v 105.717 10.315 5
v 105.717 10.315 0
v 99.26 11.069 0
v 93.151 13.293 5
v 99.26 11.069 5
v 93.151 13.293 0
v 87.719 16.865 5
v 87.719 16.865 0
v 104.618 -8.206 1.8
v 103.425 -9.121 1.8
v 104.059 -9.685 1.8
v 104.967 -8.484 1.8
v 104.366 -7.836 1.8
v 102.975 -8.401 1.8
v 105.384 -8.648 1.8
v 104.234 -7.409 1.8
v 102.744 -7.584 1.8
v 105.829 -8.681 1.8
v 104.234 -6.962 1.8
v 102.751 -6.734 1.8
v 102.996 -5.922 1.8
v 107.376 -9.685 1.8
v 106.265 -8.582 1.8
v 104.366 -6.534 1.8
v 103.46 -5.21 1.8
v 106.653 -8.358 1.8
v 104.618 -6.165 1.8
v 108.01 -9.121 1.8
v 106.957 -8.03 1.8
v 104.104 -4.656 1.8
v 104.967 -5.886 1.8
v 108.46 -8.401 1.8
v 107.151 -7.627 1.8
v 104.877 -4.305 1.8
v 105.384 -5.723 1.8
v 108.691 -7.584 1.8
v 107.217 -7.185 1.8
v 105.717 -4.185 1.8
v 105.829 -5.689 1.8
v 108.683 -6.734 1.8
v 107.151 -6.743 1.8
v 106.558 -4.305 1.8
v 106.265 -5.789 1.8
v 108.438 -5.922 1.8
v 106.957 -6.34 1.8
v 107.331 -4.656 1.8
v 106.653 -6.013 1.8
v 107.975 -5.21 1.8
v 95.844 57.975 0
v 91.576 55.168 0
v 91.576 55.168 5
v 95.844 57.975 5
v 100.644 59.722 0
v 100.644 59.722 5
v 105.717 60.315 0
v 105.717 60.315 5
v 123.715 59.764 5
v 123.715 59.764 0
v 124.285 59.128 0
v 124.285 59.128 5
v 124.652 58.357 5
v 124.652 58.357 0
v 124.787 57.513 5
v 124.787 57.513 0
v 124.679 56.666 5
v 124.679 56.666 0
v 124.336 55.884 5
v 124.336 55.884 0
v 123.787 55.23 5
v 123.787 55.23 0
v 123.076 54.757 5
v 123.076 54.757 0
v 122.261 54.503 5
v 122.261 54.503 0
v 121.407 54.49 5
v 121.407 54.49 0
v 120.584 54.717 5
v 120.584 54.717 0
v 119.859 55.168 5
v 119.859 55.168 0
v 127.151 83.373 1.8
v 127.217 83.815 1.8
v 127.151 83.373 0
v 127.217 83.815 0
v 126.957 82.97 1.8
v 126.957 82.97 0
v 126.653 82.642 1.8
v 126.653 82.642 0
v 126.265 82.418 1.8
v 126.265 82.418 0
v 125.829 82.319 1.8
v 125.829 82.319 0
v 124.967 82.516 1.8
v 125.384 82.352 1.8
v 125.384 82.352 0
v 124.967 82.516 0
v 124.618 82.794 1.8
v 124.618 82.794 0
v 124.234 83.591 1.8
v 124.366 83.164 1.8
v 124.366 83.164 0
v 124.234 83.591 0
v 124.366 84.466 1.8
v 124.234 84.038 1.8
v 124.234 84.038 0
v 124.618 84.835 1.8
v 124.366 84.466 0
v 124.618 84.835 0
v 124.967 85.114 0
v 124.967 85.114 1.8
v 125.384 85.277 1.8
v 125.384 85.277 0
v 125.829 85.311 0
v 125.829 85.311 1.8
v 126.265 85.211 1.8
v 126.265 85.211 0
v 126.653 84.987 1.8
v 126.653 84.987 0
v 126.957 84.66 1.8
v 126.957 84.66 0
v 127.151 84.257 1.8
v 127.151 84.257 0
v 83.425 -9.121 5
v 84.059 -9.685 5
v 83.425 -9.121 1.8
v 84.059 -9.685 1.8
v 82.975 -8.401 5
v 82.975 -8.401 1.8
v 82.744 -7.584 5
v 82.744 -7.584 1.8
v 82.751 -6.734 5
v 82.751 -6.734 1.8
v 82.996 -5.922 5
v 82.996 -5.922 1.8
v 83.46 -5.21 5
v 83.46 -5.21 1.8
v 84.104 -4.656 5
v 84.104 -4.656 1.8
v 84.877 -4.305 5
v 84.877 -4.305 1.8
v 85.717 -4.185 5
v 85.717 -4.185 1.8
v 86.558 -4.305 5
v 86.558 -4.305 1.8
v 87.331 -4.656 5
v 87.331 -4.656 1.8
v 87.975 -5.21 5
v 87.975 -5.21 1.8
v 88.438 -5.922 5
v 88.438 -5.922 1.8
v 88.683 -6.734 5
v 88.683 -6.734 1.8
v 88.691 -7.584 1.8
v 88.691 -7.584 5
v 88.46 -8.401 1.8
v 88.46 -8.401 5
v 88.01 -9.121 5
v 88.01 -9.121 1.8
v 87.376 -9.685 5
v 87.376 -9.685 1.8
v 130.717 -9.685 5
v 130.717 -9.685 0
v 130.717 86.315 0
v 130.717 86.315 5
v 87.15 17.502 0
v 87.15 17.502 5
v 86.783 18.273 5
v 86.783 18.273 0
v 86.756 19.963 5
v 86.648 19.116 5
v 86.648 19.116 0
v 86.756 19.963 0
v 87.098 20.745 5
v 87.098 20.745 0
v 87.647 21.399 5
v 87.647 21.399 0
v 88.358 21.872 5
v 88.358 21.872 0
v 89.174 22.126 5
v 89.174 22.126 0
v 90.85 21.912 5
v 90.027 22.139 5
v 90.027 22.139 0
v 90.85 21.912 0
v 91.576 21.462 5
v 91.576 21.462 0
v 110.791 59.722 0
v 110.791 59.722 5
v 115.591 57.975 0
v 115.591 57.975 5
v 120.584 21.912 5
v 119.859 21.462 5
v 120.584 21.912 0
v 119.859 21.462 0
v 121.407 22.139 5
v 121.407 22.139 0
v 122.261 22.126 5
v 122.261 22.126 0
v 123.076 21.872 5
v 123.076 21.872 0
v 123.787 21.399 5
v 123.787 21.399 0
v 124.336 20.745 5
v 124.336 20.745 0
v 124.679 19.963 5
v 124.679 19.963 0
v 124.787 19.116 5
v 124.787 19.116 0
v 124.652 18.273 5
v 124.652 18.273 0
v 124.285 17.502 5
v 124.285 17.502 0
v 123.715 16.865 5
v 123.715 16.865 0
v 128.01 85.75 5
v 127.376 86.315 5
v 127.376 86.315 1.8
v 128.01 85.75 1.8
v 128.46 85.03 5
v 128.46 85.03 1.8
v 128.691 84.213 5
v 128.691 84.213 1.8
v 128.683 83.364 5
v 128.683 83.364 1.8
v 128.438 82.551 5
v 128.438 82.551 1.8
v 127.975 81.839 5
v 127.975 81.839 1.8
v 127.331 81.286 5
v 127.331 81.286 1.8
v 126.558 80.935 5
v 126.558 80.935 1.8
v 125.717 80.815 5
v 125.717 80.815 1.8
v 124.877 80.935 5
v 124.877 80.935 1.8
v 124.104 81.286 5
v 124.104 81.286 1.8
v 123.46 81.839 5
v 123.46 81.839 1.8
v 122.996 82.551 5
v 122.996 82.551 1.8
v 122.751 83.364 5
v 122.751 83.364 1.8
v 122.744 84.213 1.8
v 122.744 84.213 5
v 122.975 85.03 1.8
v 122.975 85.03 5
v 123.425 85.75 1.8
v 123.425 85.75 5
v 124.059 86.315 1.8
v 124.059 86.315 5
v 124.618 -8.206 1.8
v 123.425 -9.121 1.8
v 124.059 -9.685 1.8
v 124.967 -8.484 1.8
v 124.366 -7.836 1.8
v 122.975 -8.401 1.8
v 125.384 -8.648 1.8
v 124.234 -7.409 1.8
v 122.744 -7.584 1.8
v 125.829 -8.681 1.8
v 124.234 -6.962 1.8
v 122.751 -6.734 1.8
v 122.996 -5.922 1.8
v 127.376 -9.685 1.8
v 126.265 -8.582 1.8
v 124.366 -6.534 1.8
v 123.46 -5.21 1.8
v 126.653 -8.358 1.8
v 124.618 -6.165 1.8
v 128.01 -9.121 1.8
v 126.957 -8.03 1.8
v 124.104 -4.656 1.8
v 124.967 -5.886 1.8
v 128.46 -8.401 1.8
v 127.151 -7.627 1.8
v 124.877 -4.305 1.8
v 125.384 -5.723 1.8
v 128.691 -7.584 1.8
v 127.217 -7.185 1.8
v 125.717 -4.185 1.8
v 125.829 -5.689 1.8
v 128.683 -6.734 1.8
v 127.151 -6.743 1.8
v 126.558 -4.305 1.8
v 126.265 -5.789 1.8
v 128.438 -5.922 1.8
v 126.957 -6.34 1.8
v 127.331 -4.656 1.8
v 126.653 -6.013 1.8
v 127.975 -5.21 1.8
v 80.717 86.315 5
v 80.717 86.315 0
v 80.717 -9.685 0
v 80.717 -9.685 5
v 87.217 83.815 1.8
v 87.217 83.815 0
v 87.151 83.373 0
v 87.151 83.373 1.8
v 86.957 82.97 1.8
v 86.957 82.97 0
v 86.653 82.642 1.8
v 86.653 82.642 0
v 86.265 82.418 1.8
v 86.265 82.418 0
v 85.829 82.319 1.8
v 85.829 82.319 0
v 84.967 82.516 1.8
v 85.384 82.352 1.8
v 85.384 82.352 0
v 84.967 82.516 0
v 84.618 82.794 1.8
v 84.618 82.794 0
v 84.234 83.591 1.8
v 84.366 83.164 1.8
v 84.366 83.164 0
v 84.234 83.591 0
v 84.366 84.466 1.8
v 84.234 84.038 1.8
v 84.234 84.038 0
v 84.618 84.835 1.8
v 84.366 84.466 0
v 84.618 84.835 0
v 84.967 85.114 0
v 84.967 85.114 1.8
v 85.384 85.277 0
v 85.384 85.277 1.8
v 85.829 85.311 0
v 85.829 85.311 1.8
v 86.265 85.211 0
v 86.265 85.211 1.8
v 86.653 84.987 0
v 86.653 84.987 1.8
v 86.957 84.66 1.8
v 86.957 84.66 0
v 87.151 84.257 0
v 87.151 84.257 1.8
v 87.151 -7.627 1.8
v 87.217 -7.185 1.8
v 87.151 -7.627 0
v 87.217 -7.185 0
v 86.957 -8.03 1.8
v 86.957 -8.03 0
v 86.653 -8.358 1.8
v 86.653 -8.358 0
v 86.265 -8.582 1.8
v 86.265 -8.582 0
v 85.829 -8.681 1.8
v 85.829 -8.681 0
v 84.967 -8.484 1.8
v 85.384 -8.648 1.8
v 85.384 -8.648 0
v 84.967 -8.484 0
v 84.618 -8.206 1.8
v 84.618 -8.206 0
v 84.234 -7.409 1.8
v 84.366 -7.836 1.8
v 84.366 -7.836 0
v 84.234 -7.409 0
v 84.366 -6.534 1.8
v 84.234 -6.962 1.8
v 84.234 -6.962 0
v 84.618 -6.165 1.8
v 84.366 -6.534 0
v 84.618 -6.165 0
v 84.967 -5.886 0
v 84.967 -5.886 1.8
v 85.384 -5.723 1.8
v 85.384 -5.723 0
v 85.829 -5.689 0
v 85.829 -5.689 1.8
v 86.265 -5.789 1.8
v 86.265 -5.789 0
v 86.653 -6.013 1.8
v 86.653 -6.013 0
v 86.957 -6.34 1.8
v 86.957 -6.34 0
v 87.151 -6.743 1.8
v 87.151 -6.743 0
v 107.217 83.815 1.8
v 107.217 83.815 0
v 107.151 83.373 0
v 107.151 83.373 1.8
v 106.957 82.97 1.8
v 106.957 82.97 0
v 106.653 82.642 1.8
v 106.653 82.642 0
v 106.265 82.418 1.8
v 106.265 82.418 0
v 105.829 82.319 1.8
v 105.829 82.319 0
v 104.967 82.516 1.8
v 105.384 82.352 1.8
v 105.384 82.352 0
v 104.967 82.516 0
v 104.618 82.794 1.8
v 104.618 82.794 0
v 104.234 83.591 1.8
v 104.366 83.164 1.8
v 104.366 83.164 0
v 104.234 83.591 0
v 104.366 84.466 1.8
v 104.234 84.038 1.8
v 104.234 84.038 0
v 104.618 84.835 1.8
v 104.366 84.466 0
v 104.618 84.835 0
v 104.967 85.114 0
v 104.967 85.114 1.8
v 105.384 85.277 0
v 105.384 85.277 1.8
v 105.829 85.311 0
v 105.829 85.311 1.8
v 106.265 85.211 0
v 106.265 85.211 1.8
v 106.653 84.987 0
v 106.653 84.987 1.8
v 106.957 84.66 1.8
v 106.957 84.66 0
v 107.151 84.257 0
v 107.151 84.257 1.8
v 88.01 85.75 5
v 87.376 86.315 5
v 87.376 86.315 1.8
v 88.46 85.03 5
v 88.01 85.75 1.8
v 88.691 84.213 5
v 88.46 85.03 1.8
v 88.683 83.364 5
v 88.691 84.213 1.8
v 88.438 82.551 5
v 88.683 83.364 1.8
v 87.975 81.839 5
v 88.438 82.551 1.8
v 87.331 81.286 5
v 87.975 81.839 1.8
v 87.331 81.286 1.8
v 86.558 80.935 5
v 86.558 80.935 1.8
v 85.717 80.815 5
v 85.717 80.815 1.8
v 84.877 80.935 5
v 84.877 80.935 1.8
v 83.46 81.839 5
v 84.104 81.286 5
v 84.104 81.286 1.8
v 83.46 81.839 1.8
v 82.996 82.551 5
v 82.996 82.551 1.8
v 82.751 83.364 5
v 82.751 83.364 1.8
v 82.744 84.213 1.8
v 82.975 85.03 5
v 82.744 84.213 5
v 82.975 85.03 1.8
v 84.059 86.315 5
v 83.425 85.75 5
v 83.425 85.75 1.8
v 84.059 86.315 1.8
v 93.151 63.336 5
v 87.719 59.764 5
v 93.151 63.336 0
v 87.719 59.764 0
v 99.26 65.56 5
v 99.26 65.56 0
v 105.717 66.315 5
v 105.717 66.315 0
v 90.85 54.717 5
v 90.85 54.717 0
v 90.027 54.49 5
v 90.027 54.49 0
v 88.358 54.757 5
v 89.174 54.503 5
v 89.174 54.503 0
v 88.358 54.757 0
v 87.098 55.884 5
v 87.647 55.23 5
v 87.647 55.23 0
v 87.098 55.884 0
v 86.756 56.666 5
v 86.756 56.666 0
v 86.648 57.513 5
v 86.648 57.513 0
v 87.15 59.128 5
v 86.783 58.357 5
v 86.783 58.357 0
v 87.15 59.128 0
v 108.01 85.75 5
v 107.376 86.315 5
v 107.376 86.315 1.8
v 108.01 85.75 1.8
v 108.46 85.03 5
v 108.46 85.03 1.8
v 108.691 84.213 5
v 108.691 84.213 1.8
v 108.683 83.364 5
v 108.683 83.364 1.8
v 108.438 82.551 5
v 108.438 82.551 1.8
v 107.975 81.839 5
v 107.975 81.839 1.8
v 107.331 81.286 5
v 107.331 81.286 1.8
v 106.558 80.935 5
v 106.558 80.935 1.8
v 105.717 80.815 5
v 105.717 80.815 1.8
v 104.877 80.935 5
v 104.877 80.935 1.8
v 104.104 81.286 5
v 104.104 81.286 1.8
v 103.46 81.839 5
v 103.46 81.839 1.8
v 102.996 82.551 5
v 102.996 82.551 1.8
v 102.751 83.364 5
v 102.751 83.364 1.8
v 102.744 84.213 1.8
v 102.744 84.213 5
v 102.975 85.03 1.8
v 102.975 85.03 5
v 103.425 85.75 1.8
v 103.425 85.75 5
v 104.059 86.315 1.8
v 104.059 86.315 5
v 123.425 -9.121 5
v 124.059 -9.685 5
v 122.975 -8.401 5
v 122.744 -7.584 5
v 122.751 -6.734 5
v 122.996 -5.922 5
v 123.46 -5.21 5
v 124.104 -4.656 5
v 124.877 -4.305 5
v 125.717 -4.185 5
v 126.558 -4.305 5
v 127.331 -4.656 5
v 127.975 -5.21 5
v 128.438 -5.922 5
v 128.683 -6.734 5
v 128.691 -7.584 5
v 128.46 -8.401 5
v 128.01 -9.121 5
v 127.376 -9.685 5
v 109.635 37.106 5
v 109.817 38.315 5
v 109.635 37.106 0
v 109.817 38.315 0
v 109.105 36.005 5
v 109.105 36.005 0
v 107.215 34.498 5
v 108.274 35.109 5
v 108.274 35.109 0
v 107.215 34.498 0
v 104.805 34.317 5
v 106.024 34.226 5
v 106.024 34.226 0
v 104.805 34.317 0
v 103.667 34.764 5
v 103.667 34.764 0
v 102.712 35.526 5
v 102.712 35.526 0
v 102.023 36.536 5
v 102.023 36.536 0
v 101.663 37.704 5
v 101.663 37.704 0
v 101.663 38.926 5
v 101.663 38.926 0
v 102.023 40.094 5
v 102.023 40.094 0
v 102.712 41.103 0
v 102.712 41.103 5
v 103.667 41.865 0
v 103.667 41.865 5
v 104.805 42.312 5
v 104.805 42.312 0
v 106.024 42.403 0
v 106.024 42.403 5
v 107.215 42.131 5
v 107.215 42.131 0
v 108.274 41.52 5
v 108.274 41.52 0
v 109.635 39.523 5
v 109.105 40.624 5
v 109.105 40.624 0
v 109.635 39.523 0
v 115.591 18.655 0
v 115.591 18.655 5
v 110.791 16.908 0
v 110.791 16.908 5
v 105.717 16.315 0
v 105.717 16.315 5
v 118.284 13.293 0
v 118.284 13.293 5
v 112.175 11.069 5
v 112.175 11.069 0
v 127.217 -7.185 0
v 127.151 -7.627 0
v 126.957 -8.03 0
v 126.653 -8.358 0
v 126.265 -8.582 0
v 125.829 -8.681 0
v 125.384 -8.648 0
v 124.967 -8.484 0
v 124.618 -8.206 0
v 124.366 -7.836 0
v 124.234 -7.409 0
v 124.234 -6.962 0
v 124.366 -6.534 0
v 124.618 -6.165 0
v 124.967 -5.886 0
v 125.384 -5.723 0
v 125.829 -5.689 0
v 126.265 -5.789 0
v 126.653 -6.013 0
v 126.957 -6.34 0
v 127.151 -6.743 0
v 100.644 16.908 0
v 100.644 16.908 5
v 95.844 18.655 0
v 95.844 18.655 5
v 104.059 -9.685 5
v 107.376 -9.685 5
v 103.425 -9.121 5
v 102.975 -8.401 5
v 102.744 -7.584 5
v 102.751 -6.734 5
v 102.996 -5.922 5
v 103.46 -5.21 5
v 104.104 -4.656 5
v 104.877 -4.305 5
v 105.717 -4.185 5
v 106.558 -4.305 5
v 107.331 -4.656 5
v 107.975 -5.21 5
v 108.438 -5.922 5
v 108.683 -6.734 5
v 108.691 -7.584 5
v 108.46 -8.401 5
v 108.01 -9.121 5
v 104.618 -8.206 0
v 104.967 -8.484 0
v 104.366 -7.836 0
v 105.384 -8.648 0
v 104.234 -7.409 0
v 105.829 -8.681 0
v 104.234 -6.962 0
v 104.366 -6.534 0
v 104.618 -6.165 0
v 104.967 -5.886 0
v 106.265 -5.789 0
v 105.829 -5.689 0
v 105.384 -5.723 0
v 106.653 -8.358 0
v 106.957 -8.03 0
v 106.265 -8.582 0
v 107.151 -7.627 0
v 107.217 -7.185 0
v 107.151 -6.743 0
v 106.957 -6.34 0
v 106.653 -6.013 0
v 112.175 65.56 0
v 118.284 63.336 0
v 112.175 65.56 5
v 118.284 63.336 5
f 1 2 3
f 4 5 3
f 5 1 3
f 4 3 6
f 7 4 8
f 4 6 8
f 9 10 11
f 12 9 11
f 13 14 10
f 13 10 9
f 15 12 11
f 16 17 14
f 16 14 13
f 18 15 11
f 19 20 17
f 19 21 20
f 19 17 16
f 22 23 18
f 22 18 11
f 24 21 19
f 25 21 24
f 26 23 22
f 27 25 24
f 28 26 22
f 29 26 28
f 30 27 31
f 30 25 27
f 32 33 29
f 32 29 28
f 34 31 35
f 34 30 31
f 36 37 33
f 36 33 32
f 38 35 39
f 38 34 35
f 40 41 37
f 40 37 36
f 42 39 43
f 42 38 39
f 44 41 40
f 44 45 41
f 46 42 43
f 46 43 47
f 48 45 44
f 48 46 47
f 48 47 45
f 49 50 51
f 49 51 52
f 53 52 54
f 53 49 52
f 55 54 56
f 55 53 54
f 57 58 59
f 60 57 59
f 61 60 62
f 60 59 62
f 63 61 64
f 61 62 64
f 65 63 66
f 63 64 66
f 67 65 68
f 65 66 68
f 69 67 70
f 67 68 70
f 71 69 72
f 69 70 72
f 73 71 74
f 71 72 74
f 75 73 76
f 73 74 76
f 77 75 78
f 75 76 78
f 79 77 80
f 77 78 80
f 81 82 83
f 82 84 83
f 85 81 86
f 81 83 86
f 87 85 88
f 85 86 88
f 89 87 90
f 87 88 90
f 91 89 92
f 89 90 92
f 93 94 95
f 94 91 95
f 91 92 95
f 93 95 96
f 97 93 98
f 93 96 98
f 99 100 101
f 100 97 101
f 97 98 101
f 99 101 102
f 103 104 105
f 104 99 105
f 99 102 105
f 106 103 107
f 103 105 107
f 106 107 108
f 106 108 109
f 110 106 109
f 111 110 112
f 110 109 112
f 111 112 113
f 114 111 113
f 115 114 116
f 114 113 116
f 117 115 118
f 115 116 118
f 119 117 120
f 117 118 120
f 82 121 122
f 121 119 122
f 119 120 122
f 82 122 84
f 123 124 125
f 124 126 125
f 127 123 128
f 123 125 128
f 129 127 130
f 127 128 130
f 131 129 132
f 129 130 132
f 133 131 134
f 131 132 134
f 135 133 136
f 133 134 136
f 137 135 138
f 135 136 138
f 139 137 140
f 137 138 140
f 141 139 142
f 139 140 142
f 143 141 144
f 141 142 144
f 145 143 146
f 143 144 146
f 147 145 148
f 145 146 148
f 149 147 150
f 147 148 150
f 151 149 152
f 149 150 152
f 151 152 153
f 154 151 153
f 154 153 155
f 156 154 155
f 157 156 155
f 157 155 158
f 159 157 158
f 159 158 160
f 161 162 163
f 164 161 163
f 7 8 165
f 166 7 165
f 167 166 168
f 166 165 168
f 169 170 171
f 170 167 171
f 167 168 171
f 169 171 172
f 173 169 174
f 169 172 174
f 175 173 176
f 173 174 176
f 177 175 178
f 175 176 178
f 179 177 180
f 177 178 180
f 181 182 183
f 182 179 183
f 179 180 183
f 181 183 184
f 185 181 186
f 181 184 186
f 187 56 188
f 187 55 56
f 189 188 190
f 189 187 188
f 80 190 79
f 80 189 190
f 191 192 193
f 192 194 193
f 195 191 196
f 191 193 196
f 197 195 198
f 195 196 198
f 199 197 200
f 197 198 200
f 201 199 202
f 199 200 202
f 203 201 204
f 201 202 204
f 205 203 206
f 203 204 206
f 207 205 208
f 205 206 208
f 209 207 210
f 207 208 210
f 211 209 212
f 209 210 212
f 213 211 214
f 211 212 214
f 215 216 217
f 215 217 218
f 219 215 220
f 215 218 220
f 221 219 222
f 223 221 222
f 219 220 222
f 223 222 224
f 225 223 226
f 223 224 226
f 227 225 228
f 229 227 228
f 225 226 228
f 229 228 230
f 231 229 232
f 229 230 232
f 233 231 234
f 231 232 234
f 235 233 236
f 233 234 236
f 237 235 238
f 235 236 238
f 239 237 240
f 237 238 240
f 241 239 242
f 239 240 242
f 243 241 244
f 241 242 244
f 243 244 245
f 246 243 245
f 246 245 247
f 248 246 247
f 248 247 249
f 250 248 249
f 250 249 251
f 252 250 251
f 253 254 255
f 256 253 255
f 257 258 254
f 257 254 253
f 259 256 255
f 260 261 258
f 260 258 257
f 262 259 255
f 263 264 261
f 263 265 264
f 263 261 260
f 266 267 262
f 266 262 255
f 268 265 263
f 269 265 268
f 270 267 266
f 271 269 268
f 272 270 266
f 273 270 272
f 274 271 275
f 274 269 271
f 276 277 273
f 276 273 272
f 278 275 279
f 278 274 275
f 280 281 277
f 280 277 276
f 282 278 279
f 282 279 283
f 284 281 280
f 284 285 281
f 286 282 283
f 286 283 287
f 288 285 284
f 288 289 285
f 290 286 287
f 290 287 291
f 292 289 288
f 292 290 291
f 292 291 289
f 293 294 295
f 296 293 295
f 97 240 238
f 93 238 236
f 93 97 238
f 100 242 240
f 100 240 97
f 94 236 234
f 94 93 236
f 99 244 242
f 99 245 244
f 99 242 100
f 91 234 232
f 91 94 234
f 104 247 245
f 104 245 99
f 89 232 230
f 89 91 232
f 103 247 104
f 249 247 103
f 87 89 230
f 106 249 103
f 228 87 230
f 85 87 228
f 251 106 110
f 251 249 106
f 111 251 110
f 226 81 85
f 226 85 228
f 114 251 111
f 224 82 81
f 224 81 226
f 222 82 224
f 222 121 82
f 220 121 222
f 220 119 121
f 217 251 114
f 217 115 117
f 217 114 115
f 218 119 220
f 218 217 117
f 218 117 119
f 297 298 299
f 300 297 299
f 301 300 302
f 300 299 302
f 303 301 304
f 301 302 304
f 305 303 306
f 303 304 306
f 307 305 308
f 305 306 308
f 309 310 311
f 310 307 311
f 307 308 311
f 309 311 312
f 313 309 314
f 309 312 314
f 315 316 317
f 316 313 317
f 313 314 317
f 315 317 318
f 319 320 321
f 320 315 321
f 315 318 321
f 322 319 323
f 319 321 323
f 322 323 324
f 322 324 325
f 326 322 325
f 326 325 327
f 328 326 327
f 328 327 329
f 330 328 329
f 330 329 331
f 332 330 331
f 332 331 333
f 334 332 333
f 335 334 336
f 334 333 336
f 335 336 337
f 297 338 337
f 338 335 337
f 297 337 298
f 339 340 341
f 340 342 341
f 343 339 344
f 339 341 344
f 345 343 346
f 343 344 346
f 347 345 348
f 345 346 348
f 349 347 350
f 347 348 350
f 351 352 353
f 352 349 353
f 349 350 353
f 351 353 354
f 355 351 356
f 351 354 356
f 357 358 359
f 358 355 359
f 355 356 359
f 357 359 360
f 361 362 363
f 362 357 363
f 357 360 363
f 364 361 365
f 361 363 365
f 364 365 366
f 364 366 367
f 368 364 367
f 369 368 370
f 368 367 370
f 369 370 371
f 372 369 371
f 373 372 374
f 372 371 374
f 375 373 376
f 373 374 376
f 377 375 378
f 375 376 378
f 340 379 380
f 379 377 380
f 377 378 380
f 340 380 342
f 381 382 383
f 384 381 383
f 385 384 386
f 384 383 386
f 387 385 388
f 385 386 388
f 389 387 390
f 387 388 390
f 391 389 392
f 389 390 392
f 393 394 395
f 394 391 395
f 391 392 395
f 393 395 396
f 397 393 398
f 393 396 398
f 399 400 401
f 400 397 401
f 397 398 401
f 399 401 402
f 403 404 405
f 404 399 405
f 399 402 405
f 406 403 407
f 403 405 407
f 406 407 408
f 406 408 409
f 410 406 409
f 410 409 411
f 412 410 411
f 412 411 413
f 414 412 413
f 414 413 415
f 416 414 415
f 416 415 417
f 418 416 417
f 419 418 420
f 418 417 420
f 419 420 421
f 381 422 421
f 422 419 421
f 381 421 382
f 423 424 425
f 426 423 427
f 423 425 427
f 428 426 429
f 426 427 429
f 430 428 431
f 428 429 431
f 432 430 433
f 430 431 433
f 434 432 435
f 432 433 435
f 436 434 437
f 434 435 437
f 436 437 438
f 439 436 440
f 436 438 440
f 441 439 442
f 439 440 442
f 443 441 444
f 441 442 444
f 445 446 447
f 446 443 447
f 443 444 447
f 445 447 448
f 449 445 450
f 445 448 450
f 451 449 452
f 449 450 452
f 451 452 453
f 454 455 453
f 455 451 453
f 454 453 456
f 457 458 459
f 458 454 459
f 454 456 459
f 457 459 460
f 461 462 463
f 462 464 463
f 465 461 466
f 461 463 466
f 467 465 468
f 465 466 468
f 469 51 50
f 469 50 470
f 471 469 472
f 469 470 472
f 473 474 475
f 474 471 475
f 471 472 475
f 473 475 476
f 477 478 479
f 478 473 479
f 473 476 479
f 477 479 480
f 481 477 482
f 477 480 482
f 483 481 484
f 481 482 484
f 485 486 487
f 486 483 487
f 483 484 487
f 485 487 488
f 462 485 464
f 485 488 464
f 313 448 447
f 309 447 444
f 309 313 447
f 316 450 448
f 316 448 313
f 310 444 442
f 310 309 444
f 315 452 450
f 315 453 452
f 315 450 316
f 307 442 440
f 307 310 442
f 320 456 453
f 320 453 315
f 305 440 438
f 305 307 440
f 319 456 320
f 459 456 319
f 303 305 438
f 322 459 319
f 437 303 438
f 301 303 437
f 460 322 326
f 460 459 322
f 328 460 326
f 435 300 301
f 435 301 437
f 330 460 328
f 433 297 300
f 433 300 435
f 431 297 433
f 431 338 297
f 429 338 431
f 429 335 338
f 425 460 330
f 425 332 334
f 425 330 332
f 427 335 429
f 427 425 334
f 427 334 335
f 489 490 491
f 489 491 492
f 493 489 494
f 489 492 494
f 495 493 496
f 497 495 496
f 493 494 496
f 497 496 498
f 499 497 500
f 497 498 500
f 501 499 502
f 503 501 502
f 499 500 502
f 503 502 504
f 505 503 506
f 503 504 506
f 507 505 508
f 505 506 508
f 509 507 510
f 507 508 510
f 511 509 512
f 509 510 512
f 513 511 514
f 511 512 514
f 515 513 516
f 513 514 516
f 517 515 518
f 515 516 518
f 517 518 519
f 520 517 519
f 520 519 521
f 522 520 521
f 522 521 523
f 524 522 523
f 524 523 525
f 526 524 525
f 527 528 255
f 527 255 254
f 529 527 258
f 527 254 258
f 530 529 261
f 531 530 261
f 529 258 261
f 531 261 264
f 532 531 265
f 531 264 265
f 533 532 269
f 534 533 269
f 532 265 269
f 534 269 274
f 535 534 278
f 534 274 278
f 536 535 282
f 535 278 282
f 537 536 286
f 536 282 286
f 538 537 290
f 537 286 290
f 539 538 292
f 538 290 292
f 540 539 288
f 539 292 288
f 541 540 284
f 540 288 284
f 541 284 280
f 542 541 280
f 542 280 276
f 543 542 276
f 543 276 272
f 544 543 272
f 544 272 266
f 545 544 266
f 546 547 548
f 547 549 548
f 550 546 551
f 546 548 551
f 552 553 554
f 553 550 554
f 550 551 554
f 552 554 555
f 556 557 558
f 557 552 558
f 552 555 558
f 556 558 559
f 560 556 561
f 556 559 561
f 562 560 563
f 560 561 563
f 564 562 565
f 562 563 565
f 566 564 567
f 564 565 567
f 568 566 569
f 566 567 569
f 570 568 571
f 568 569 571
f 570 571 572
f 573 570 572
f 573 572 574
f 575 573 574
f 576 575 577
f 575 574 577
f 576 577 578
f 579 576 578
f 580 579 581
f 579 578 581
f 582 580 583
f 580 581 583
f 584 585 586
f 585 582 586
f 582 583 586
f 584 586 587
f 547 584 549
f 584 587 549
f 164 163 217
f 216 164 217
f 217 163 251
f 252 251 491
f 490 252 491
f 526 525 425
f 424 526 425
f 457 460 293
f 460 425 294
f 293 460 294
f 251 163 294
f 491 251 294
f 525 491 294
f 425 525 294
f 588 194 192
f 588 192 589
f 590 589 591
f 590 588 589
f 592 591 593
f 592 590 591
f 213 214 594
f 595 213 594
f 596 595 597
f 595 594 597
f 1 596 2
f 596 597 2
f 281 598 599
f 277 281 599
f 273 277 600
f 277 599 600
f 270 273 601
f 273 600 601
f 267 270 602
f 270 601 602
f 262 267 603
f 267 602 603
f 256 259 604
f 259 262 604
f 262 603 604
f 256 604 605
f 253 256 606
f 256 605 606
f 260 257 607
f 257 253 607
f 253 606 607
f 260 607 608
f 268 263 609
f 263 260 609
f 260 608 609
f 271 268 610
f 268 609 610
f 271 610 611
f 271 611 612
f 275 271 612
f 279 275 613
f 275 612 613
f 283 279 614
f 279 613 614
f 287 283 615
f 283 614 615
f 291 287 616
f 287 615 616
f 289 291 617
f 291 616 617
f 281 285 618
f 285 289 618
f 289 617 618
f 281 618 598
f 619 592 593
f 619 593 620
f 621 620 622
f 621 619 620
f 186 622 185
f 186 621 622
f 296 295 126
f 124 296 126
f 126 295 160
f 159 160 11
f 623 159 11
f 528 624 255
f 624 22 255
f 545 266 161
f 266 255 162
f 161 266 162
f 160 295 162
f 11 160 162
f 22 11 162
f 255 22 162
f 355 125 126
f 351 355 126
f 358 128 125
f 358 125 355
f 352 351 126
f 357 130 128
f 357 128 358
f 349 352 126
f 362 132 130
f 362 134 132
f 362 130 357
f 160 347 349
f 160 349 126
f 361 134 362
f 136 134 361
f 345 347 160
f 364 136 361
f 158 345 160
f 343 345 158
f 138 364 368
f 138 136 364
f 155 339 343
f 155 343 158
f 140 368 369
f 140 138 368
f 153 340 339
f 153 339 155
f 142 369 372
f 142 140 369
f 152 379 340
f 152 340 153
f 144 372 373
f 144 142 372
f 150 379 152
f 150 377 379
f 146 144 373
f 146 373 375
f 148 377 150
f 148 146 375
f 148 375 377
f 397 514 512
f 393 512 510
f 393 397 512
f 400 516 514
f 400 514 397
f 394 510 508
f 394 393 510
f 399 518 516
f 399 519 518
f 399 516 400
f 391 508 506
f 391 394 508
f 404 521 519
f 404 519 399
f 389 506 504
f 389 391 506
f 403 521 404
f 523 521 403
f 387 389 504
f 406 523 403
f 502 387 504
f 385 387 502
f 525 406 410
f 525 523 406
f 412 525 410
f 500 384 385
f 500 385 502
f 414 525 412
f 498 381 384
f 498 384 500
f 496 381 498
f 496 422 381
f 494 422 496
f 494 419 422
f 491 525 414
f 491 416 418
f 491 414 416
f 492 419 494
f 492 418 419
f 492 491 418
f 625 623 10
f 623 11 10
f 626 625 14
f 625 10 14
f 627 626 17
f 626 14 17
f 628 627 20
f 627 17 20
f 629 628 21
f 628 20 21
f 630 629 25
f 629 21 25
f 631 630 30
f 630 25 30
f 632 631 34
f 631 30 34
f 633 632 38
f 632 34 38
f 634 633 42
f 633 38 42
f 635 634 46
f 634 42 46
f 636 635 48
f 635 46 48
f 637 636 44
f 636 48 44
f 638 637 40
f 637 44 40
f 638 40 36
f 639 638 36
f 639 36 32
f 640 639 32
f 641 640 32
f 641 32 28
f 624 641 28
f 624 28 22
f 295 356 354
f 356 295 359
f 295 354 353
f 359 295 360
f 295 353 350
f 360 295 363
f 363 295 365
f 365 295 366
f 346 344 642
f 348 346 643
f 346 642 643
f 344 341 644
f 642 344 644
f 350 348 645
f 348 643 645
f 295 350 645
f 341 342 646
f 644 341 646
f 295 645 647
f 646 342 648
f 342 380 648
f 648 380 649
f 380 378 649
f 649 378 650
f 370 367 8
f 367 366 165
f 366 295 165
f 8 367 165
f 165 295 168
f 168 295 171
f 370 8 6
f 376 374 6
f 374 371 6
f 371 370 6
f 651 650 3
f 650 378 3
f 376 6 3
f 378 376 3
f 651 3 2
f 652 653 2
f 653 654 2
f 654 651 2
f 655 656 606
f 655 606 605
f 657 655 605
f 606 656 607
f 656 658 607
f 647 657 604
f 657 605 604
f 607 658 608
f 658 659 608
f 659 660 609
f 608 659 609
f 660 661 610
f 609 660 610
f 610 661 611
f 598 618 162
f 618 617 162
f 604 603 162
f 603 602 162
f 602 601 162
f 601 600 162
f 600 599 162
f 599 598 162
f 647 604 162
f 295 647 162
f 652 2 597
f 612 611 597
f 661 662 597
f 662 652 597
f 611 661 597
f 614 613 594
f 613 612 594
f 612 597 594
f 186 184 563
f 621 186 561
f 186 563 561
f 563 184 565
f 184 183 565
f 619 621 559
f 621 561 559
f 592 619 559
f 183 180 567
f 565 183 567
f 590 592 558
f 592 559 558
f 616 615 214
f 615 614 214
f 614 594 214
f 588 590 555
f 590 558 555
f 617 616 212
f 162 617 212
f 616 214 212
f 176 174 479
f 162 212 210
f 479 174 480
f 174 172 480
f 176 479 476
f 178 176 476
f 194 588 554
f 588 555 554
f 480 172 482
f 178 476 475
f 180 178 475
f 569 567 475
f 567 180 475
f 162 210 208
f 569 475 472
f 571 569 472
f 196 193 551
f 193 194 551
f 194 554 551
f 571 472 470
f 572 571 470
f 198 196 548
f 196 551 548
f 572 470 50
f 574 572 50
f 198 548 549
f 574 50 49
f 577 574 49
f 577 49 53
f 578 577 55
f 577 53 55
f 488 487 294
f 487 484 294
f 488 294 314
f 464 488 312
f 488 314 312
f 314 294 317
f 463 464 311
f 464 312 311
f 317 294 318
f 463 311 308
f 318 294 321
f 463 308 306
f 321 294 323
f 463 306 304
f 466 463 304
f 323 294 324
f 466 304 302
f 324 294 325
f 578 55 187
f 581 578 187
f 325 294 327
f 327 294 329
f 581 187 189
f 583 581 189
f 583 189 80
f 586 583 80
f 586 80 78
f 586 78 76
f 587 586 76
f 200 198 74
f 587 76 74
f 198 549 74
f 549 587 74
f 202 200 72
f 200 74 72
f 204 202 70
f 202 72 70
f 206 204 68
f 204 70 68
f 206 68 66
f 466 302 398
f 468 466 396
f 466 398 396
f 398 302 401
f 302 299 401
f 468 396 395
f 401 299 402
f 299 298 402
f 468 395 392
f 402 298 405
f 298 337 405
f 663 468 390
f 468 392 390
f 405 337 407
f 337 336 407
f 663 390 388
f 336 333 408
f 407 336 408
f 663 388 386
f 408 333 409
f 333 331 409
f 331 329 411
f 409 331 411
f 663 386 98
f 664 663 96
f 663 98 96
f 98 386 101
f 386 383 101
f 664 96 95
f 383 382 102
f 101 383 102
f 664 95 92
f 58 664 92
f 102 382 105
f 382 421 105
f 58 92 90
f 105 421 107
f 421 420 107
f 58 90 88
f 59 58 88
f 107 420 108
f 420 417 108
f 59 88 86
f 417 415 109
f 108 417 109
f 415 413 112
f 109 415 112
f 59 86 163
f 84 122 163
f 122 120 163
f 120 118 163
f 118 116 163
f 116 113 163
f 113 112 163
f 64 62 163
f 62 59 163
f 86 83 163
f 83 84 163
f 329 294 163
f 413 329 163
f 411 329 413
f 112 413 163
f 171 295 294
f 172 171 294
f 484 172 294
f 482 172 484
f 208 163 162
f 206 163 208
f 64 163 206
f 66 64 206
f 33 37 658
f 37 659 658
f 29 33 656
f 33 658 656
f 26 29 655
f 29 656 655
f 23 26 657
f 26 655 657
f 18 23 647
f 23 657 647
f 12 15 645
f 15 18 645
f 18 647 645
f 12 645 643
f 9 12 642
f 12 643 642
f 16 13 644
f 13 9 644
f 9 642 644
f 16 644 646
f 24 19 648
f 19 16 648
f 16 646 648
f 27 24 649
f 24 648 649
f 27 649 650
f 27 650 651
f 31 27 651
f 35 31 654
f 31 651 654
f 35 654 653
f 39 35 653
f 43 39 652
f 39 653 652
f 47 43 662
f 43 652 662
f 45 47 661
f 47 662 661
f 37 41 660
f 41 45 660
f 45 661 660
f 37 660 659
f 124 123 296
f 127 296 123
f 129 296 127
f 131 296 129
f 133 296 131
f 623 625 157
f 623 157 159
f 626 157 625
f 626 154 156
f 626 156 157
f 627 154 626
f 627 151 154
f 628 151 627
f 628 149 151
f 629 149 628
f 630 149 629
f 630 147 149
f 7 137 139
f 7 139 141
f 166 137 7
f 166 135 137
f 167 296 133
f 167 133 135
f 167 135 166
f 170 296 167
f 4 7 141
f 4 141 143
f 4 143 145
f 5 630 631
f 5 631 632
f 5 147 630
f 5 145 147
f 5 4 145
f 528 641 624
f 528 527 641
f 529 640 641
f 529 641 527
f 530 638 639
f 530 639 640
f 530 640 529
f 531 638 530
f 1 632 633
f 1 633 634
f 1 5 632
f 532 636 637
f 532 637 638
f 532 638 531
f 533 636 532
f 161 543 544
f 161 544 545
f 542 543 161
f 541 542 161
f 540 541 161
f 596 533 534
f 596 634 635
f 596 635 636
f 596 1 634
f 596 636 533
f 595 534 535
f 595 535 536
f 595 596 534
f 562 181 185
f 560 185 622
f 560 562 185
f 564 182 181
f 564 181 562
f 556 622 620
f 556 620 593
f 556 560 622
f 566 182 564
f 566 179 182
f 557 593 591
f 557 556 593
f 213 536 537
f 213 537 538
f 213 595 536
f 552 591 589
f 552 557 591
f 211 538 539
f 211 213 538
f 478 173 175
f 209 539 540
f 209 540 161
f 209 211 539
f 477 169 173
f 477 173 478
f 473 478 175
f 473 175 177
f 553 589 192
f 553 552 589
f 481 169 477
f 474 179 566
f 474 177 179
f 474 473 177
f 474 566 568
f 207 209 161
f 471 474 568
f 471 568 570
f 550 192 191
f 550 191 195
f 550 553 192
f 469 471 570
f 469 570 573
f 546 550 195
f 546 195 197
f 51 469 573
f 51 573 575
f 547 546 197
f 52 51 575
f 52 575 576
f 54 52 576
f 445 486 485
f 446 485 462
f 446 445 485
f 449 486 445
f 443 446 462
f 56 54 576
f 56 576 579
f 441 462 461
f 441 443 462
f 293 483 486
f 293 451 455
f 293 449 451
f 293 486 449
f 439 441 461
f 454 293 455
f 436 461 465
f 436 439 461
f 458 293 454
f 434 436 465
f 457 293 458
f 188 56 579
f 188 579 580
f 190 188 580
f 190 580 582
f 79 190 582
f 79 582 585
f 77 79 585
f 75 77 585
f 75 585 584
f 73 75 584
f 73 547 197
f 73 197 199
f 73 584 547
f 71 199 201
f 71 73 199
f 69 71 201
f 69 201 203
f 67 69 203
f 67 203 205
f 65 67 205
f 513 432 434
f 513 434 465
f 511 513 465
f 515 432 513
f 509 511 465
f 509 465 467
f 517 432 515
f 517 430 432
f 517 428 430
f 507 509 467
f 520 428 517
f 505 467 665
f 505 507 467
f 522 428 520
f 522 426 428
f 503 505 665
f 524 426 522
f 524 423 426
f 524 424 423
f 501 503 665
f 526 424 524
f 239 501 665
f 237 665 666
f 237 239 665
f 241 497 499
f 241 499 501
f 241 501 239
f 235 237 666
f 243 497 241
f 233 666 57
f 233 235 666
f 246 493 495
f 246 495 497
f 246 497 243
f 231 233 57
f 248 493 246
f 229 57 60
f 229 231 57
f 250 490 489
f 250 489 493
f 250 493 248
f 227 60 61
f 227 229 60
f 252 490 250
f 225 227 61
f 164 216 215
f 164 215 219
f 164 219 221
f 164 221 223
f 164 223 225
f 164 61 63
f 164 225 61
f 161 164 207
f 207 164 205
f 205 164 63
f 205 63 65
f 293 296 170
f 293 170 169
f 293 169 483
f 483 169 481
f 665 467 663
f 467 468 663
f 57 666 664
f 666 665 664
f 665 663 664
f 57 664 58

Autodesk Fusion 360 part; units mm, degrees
sketch "Schizzo5" plane through (0, 0, 0) normal (0, 0, 1) x (1, 0, 0)
  line L0 (80.7173, 86.3147) -> (80.7173, -9.6853)
  circle A0 centre (85.7173, -7.1853) radius 1.5
  circle A1 centre (105.7173, 38.3147) radius 25 construction
  arc A2 (125.5163, 58.1137) -> (105.7173, 66.3147) centre (105.7173, 38.3147) ccw
  circle A3 centre (121.787, 57.4658) radius 3
  circle A4 centre (89.6476, 57.4658) radius 3
  arc A5 (105.7173, 66.3147) -> (85.9183, 58.1137) centre (105.7173, 38.3147) ccw
  circle A6 centre (125.7173, 83.8147) radius 3
  arc A7 (105.7173, 10.3147) -> (125.5163, 18.5157) centre (105.7173, 38.3147) ccw
  line L1 (80.7173, 38.3147) -> (130.7173, 38.3147) construction
  circle A8 centre (105.7173, 83.8147) radius 1.5
  circle A9 centre (85.7173, 83.8147) radius 3
  line L2 (105.7173, 38.3147) -> (121.787, 19.1636) construction
  arc A10 (105.7173, 66.3147) -> (85.9183, 58.1137) centre (105.7173, 38.3147) ccw
  circle A11 centre (85.7173, 83.8147) radius 1.5
  line L3 (130.7173, 86.3147) -> (80.7173, 86.3147)
  arc A12 (125.5163, 58.1137) -> (105.7173, 66.3147) centre (105.7173, 38.3147) ccw
  circle A13 centre (125.7173, 83.8147) radius 1.5
  line L4 (105.7173, 38.3147) -> (89.6274, 54.4047) construction
  circle A14 centre (105.7173, 83.8147) radius 3
  arc A15 (105.7173, 10.3147) -> (125.5163, 18.5157) centre (105.7173, 38.3147) ccw
  line L5 (105.7173, 38.3147) -> (105.7173, 13.3147) construction
  circle A16 centre (105.7173, 38.3147) radius 4.1
  circle A17 centre (105.7173, -7.1853) radius 1.5
  circle A18 centre (89.6476, 19.1636) radius 3
  line L6 (130.7173, -9.6853) -> (130.7173, 86.3147)
  arc A19 (85.9183, 18.5157) -> (105.7173, 10.3147) centre (105.7173, 38.3147) ccw
  line L7 (85.7173, 86.3147) -> (85.7173, -9.6853) construction
  arc A20 (105.7173, 13.3147) -> (121.787, 19.1636) centre (105.7173, 38.3147) ccw
  circle A21 centre (121.787, 19.1636) radius 3
  circle A22 centre (85.7173, -7.1853) radius 3
  circle A23 centre (105.7173, -7.1853) radius 3
  circle A24 centre (125.7173, -7.1853) radius 1.5
  line L8 (105.7173, 38.3147) -> (123.668, 56.2654) construction
  line L9 (80.7173, -9.6853) -> (130.7173, -9.6853)
  circle A25 centre (125.7173, -7.1853) radius 3
  line L10 (80.7173, -7.1853) -> (130.7173, -7.1853) construction
  line L11 (105.7173, 38.3147) -> (89.6476, 19.1636) construction
  arc A26 (85.9183, 18.5157) -> (105.7173, 10.3147) centre (105.7173, 38.3147) ccw
  line L12 (105.7173, 86.3147) -> (105.7173, -9.6853) construction
  arc A27 (89.6476, 19.1636) -> (105.7173, 13.3147) centre (105.7173, 38.3147) ccw
  line L13 (105.7173, 38.3147) -> (105.7173, 63.3147) construction
  line L14 (105.7173, 38.3147) -> (105.7173, 63.3147) construction
  line L15 (105.7173, 38.3147) -> (105.7173, 13.3147) construction
  arc A28 (105.7173, 16.3147) -> (121.2737, 22.7584) centre (105.7173, 38.3147) ccw
  arc A29 (90.161, 22.7584) -> (105.7173, 16.3147) centre (105.7173, 38.3147) ccw
  arc A30 (105.7173, 60.3147) -> (90.161, 53.8711) centre (105.7173, 38.3147) ccw
  arc A31 (121.2737, 53.8711) -> (105.7173, 60.3147) centre (105.7173, 38.3147) ccw
  dimension "d219" = 3
  dimension "d220" = 3
  dimension "d221" = 50
  dimension "d222" = 96
  dimension "d223" = 2.5
  dimension "d224" = 20
  dimension "d225" = 3
  dimension "d226" = 6
  dimension "d227" = 3
  dimension "d228" = 6
  dimension "d229" = 8.2
  dimension "d230" = 40
  dimension "d231" = 6
  dimension "d232" = 40
  dimension "d233" = 6
  dimension "d246" = -3
  dimension "d247" = -3
extrude "Estrusione24" add sketch "Schizzo5" along normal blind 5 contours L0 A6 A9 L3 A14 L6 A22 A23 L9 A25
extrude "Estrusione25" add sketch "Schizzo5" along normal blind 1.8 contours A9 L3 | A22 L9 | L3 A14 | A23 L9 | A6 L3 | L9 A25 picked at (85.7547, 85.98) picked at (85.7547, -9.3505) picked at (105.7547, 85.98) picked at (105.7547, -9.3505) picked at (125.7547, 85.98) picked at (125.7547, -9.3505)
equation "d225 = d227"
equation "d226 = d228"
